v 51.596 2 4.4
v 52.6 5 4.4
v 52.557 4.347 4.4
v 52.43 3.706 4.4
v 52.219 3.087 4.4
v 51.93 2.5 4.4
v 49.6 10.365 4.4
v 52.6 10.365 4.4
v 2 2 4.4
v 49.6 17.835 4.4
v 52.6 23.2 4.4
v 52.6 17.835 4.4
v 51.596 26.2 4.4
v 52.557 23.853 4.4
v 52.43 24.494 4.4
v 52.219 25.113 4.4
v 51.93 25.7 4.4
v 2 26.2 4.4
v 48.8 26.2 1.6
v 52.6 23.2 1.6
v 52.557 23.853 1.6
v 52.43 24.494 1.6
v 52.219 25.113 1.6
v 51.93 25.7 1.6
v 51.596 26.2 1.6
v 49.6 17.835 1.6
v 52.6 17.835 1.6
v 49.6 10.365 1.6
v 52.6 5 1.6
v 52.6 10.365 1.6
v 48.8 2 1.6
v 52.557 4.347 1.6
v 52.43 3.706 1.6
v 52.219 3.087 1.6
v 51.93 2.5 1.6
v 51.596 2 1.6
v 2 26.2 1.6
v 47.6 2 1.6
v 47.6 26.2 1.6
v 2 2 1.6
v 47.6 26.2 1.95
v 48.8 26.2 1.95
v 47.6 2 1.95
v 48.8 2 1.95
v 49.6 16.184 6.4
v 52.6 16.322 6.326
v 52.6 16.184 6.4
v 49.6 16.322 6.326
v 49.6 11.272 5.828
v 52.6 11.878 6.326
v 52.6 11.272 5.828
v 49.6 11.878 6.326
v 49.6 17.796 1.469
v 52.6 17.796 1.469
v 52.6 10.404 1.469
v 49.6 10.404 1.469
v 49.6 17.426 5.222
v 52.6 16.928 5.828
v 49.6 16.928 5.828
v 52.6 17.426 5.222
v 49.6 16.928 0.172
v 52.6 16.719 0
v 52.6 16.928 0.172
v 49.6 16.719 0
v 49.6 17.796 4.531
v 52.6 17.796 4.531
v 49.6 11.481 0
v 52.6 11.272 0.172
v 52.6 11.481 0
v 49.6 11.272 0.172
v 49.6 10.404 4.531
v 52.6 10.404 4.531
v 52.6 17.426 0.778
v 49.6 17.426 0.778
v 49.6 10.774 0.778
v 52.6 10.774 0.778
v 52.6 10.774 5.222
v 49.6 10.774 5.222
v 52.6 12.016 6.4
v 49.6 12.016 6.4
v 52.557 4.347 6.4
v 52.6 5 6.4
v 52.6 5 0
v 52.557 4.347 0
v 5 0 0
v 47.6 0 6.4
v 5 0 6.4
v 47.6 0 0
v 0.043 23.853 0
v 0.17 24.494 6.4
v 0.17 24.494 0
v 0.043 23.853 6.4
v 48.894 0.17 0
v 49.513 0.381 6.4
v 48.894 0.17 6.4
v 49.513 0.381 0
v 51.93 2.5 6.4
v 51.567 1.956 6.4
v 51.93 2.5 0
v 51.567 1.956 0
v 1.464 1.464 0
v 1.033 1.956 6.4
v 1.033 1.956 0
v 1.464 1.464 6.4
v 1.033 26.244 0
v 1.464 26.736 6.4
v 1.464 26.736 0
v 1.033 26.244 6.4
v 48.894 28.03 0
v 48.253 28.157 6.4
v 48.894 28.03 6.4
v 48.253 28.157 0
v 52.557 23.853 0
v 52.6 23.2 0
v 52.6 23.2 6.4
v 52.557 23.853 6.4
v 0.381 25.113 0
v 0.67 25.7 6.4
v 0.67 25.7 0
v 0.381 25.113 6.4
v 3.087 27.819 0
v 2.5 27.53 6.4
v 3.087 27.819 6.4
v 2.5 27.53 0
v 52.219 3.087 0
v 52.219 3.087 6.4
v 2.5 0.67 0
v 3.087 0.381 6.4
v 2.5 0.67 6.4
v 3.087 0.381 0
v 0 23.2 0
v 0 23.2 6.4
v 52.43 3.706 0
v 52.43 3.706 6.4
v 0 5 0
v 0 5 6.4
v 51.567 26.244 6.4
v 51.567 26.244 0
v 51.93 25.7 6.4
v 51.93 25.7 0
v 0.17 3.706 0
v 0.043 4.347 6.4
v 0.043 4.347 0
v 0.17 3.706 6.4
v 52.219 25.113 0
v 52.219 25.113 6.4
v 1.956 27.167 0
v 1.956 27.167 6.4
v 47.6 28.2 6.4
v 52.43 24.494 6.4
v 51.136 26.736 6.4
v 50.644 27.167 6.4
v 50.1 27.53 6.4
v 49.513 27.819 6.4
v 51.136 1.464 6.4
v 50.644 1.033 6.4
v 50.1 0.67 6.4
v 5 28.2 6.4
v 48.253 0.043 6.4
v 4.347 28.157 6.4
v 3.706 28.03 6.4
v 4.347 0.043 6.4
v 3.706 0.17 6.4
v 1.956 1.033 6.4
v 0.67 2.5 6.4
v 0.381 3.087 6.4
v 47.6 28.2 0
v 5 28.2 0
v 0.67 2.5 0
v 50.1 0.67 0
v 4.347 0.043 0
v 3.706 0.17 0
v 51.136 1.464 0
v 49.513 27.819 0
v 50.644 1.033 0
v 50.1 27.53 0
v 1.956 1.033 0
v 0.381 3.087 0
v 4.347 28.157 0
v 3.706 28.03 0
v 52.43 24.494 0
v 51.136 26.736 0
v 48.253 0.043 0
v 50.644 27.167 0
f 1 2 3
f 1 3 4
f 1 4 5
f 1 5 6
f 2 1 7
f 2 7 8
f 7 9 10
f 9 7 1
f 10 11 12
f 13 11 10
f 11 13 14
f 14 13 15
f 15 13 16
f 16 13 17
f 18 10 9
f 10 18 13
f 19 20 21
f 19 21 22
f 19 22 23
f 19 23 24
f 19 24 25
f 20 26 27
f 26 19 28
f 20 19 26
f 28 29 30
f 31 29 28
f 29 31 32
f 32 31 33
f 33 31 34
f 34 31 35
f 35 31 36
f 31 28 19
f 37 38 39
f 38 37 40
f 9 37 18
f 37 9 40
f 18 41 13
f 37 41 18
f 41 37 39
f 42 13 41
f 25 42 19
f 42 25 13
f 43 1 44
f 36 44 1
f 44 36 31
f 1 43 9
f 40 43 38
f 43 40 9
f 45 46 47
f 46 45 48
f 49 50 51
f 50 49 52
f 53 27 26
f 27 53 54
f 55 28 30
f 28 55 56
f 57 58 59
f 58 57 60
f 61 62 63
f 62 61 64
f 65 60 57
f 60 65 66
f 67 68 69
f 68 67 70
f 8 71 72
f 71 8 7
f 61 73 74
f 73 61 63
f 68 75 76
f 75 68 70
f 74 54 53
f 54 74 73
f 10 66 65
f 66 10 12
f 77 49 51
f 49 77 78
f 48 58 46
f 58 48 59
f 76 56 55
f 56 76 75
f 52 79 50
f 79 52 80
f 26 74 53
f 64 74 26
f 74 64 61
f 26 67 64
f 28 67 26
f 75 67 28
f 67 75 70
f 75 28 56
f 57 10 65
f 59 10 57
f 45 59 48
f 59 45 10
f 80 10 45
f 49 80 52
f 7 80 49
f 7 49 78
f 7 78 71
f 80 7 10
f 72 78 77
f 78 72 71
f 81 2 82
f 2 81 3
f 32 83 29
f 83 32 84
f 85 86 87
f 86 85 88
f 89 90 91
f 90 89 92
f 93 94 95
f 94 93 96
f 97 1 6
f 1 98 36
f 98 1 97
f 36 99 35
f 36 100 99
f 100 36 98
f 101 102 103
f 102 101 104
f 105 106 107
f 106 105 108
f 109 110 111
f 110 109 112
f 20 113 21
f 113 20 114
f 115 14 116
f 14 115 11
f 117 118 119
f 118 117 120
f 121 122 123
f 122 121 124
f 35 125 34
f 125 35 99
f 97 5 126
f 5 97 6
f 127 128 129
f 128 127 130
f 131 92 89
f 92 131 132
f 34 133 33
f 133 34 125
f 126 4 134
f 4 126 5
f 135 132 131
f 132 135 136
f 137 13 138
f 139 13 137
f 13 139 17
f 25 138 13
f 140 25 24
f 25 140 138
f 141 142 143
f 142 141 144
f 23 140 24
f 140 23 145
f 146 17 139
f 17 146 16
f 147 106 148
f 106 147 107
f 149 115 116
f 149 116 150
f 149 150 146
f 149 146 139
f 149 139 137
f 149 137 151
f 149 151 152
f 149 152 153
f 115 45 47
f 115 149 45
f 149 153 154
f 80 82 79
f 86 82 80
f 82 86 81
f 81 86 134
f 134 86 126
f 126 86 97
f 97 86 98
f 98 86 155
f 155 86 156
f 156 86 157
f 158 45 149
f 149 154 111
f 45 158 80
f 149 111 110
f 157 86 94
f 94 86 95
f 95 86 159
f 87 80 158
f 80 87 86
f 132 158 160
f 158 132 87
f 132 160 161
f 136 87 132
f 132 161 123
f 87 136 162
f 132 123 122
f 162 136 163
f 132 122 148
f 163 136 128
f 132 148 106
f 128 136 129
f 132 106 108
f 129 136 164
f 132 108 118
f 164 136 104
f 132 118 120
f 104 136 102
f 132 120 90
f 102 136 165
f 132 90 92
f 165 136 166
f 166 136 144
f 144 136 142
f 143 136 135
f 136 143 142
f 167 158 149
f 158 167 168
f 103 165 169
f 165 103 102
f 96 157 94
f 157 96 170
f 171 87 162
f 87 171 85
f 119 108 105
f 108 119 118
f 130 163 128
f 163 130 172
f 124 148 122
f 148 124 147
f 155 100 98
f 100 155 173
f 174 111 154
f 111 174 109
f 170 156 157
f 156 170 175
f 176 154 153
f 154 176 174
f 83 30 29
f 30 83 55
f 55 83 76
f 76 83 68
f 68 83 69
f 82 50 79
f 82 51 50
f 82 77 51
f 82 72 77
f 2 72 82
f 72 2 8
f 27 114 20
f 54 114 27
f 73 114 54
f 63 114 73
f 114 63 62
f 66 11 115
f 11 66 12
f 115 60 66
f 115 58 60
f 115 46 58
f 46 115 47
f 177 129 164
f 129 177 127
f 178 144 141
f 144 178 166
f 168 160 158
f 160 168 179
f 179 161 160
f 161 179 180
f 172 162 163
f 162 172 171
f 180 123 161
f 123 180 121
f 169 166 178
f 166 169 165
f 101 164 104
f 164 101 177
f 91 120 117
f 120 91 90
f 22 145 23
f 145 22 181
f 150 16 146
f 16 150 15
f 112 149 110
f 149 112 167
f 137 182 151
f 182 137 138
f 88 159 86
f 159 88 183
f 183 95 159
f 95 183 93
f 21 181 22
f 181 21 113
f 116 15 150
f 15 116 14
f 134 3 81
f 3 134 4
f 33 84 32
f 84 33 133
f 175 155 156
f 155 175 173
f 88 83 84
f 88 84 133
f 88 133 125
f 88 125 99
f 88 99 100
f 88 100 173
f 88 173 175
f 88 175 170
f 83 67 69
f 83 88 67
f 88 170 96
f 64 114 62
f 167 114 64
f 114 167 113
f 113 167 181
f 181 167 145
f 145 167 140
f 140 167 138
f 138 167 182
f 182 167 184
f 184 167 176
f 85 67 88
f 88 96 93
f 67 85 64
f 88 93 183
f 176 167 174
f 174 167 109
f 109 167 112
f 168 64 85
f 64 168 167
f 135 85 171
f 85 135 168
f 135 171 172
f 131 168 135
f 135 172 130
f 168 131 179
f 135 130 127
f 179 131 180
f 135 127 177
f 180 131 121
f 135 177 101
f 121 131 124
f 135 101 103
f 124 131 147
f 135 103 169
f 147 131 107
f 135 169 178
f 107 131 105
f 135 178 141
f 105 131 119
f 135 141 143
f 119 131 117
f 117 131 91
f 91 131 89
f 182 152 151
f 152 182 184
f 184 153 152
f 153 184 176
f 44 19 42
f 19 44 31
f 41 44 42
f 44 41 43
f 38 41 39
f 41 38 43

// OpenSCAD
// THYLORA · Hidden key foot pad
// Four pads go on the back/bottom of the statue (double-sided tape on top).
// All four look the same. One has a slot that the filing-cabinet key slides into
// from the edge that faces the wall, so it cannot be seen from the front.
// Underneath each pad: a felt or rubber dot, so it reads as a normal cushion foot.
//
// MEASURE THE REAL KEY FIRST, then change the numbers below.
// Print in a filament that matches the statue's color, or print in white and paint.
// Do NOT print in plain black unless the statue is black.

/* [Key: measure with a ruler or calipers, in millimetres] */
key_length    = 50;   // tip to end of the head
key_width     = 23;   // widest part, usually the head
key_thickness = 2.2;  // thickest part

/* [Pad] */
clearance   = 0.6;    // extra room around the key so it slides
wall        = 2.0;    // plastic around the slot
floor_t     = 1.6;    // plastic under the slot
corner_r    = 5;      // rounded corners
grip_bump   = 0.35;   // small bump that holds the key in; 0 = none
with_slot   = true;   // false makes the three matching decoys

pad_l = key_length + clearance + wall;          // open on one end
pad_w = key_width  + 2*clearance + 2*wall;
pad_h = floor_t + key_thickness + clearance + wall;

module rounded_box(l, w, h, r) {
  hull() for (x = [r, l - r], y = [r, w - r]) translate([x, y, 0]) cylinder(r = r, h = h, $fn = 48);
}

difference() {
  rounded_box(pad_l, pad_w, pad_h, corner_r);
  if (with_slot) {
    // Slot opens at x = pad_l (the edge that faces the wall).
    translate([wall, wall, floor_t])
      cube([key_length + clearance + 1, key_width + 2*clearance, key_thickness + clearance]);
    // Finger notch so the key can be pushed out.
    translate([pad_l, pad_w/2, floor_t + (key_thickness + clearance)/2])
      rotate([0, 90, 0]) cylinder(r = 4, h = 6, center = true, $fn = 32);
  }
}

// Grip bump: a thin ridge across the slot floor near the opening.
if (with_slot && grip_bump > 0)
  translate([pad_l - wall - 3, wall, floor_t])
    cube([1.2, key_width + 2*clearance, grip_bump]);

// Print flat, top-down as modelled, 0.2 mm layers, 20% infill, no supports needed
// for slots under ~25 mm wide (bridging). Test-fit with the real key before the
// final color print.
